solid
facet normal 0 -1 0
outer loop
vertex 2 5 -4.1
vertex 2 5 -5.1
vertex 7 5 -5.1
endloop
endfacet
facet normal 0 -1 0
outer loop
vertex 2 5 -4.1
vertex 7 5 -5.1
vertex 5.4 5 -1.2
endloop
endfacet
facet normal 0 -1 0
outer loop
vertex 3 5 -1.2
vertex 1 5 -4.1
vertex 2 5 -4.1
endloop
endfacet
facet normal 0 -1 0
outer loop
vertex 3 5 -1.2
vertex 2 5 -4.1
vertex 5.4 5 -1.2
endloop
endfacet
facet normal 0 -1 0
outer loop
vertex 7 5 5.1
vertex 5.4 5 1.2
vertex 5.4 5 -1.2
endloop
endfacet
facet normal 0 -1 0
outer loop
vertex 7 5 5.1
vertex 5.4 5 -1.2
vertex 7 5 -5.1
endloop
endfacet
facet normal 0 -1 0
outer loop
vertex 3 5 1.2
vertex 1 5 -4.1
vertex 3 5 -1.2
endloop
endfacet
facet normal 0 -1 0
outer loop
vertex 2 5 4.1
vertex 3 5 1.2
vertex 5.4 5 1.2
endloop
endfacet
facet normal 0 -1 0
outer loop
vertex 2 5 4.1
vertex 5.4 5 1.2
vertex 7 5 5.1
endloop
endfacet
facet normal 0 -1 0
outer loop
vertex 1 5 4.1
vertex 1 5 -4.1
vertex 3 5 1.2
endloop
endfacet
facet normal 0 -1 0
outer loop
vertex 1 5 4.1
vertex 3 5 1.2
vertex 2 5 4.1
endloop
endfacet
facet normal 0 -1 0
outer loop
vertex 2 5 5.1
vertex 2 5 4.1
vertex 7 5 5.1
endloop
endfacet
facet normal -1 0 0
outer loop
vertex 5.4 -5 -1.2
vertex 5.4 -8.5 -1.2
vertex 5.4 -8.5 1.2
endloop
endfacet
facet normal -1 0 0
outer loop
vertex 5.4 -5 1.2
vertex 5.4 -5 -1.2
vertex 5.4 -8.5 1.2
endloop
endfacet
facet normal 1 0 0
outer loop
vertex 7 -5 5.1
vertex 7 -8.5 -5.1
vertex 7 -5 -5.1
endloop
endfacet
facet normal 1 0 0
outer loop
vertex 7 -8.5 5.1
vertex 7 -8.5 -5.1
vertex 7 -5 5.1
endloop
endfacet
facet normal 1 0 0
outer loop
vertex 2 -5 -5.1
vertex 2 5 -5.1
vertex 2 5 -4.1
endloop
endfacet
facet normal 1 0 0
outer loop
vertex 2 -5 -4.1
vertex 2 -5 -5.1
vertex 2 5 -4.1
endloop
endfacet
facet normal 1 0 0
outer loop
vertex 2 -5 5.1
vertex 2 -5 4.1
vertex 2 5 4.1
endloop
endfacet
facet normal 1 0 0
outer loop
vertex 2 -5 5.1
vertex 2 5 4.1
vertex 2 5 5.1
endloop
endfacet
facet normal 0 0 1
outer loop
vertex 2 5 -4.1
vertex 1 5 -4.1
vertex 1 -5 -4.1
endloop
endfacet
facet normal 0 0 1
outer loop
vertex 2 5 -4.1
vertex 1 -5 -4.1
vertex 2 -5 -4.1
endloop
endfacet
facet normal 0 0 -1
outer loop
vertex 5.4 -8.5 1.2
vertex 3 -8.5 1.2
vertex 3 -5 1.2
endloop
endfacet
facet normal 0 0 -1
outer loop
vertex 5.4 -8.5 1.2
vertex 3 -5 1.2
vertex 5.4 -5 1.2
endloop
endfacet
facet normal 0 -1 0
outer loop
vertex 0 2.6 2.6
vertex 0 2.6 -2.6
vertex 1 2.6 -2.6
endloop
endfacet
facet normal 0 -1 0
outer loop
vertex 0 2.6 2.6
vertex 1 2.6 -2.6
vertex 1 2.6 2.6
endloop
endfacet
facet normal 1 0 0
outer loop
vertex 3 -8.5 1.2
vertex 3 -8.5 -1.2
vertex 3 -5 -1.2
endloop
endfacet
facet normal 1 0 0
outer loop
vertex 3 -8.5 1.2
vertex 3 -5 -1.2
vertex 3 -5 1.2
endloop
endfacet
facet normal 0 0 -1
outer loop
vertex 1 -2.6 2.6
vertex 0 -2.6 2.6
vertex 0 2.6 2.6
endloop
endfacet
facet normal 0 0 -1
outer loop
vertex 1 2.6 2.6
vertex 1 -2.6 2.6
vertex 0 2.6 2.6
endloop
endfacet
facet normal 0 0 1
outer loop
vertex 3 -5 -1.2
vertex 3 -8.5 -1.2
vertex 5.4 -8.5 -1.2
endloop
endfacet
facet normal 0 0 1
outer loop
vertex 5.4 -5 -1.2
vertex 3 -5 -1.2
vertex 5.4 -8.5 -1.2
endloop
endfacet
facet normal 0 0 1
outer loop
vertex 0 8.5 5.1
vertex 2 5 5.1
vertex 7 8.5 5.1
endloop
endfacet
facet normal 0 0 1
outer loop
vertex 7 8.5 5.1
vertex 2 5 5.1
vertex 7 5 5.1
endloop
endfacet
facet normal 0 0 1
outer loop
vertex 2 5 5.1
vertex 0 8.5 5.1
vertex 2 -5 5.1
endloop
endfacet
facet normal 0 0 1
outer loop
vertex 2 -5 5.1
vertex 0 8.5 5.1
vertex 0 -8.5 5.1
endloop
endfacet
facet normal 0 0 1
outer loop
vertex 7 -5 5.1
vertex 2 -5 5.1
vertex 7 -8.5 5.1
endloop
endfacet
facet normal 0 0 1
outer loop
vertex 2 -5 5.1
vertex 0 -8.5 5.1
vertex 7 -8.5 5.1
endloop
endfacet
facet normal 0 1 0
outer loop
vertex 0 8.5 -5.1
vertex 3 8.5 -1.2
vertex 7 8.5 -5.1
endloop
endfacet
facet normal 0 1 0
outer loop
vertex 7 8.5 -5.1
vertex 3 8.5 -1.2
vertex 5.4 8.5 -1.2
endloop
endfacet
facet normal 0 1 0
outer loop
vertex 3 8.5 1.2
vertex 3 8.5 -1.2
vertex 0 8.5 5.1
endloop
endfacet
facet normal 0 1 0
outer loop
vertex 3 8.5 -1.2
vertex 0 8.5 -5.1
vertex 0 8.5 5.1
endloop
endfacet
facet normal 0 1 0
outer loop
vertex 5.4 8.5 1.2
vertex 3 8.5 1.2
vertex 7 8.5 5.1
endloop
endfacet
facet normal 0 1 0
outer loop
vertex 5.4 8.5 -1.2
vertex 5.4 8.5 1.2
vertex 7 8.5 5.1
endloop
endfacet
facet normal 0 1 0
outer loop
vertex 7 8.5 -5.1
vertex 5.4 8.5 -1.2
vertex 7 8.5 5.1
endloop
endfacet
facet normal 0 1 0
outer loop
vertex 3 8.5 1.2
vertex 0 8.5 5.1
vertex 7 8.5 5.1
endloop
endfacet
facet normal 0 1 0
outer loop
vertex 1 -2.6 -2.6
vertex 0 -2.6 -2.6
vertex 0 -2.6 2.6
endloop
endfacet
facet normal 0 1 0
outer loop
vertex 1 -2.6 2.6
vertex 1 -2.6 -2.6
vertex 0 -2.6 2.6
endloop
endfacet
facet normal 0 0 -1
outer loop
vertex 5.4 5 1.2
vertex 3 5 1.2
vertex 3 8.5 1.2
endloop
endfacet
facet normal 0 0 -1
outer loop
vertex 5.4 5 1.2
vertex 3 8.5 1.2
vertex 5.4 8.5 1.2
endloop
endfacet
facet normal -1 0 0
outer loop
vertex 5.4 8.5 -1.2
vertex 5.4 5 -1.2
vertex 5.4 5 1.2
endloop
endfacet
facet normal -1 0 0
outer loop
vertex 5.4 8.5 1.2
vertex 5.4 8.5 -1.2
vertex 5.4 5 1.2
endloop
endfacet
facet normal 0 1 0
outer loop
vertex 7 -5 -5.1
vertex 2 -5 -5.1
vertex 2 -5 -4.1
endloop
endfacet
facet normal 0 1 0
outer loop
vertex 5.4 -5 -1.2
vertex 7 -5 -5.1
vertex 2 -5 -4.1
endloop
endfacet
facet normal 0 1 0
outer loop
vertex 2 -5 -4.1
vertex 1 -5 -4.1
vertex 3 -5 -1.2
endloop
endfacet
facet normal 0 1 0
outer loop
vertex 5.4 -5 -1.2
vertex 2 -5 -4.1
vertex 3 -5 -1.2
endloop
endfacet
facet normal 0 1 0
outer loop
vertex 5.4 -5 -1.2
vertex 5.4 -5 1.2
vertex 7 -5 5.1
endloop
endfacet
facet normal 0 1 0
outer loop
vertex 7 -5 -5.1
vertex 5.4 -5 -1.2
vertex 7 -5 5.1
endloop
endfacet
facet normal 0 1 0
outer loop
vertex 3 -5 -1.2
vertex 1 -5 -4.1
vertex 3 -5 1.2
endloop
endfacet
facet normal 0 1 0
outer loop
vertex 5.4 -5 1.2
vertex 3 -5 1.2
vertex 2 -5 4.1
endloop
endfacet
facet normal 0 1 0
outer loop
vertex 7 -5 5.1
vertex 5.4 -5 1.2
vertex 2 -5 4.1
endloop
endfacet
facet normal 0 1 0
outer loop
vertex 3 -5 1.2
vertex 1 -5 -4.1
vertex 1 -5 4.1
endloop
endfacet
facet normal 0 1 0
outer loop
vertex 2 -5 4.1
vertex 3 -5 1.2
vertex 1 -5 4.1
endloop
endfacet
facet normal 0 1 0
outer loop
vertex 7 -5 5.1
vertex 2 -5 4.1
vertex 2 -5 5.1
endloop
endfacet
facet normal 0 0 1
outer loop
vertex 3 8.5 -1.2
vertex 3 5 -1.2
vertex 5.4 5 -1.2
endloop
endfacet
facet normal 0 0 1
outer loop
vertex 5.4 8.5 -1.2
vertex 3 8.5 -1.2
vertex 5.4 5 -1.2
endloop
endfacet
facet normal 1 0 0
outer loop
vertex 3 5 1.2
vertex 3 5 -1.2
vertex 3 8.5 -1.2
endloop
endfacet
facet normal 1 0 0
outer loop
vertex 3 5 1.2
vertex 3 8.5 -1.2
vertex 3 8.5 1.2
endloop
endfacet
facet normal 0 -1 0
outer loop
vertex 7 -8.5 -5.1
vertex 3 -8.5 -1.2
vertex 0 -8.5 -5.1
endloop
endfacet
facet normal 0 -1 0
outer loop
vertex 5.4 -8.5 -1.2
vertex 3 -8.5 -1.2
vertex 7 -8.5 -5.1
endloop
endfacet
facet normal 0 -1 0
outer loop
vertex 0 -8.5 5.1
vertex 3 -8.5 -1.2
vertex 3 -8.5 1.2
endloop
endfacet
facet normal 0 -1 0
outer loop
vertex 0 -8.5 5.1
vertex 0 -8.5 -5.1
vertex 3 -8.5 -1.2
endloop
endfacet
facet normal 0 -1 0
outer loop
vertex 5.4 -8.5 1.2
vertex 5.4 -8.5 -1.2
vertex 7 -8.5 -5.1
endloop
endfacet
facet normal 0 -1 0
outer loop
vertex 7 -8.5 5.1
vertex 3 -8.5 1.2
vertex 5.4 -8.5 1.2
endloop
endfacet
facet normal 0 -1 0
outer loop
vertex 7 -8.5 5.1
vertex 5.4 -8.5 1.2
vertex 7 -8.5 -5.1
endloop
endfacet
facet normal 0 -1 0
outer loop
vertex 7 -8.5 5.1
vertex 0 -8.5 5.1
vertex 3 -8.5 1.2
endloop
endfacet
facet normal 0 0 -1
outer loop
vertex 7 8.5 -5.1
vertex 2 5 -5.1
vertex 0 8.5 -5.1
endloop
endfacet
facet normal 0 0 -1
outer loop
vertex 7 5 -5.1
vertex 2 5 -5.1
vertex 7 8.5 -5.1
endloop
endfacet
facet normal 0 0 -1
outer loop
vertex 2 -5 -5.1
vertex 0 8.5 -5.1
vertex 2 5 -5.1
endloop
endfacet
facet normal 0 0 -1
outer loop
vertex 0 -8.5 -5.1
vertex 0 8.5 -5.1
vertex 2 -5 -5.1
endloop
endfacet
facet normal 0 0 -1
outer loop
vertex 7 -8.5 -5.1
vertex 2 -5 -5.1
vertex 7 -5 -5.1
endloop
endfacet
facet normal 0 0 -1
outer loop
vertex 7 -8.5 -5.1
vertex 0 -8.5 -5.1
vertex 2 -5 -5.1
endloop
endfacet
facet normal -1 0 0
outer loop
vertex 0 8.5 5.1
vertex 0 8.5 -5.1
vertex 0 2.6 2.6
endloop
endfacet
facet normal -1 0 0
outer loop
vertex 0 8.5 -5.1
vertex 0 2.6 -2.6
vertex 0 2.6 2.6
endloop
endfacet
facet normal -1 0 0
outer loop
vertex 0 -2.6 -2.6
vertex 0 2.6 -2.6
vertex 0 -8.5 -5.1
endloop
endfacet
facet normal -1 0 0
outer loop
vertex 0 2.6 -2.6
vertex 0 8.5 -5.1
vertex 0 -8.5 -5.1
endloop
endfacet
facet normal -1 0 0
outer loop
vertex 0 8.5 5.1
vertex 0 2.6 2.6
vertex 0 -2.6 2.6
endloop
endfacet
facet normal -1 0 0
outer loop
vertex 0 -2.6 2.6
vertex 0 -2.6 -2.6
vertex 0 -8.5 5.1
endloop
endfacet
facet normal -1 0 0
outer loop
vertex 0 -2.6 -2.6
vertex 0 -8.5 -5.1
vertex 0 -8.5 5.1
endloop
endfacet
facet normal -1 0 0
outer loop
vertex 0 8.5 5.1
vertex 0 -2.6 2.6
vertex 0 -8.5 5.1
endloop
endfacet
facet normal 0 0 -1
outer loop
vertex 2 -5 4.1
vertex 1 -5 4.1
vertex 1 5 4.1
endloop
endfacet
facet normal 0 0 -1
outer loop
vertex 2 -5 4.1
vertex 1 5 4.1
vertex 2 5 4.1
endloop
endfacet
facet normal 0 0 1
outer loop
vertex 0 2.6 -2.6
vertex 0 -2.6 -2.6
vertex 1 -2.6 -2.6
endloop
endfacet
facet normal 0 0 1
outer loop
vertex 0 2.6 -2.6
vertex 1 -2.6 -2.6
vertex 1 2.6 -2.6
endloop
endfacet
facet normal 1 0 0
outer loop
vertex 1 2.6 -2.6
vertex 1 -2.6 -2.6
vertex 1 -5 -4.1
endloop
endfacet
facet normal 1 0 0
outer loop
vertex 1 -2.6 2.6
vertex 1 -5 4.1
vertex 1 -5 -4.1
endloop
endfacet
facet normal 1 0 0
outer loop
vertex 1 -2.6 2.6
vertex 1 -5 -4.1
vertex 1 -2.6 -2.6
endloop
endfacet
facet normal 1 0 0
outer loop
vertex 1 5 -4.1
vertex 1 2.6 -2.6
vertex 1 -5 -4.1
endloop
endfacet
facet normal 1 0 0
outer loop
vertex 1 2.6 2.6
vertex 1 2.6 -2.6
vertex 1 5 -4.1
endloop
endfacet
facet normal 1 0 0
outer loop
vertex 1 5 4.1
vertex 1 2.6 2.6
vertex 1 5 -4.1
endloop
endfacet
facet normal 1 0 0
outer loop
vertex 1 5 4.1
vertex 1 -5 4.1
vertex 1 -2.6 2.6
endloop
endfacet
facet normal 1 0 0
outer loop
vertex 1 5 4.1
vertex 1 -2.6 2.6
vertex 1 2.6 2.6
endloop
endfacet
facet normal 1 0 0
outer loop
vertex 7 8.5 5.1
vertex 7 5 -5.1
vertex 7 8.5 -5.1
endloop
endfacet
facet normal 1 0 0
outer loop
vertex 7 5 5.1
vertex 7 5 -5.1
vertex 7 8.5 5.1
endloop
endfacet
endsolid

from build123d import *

# Parameters (mm, degrees)
SKETCH049_W      = 1
SKETCH049_H      = 1
EXTRUDE052_DEPTH = 8.5
SKETCH048_W      = 2.4
SKETCH048_H      = 2.4
EXTRUDE051_DEPTH = 8.5
SKETCH046_W      = 5.2
SKETCH046_H      = 5.2
EXTRUDE049_DEPTH = 1
SKETCH047_W      = 10
SKETCH047_H      = 10.2
EXTRUDE050_DEPTH = 8
SKETCH045_W      = 7
SKETCH045_H      = 10.2
EXTRUDE048_DEPTH = 8.5


with BuildPart() as extrude052:
    # Sketch049 → Extrude052 (new body, symmetric)
    with BuildSketch(Plane.XZ):
        with Locations((1.5, -4.6)):
            Rectangle(SKETCH049_W, SKETCH049_H)
        with Locations((1.5, 4.6)):
            Rectangle(SKETCH049_W, SKETCH049_H)
    extrude(amount=EXTRUDE052_DEPTH, both=True)


with BuildPart() as extrude_buco_per_perno_blocco_neopixel:
    # Sketch048 → Extrude051 (new body, symmetric)
    with BuildSketch(Plane.XZ):
        with Locations((4.2, 0)):
            Rectangle(SKETCH048_W, SKETCH048_H)
    extrude(amount=EXTRUDE051_DEPTH, both=True)


with BuildPart() as extrude_scavo_5x5_neopixel:
    # Sketch046 → Extrude049 (new body)
    with BuildSketch(Plane.YZ):
        Rectangle(SKETCH046_W, SKETCH046_H)
    extrude(amount=EXTRUDE049_DEPTH)


with BuildPart() as extrude_scavo_10x10_neopixel_corpo:
    # Sketch047 → Extrude050 (new body)
    with BuildSketch(Plane.YZ):
        Rectangle(SKETCH047_W, SKETCH047_H)
    extrude(amount=EXTRUDE050_DEPTH)


with BuildPart() as extrude_scavo_10x10_neopixel_corpo_1:
    # Extrude050 placement: moved
    add(extrude_scavo_10x10_neopixel_corpo.part.moved(Location((1, 0, 0))))


with BuildPart() as fusion_neopixel:
    # Sketch045 → Extrude048 (new body, symmetric)
    with BuildSketch(Plane.XZ):
        with Locations((3.5, 0)):
            Rectangle(SKETCH045_W, SKETCH045_H)
    extrude(amount=EXTRUDE048_DEPTH, both=True)

    # Cut030: cut Extrude scavo 10x10 neopixel corpo
    add(extrude_scavo_10x10_neopixel_corpo_1.part, mode=Mode.SUBTRACT)

    # Cut031: cut Extrude scavo 5x5 neopixel
    add(extrude_scavo_5x5_neopixel.part, mode=Mode.SUBTRACT)

    # Cut032: cut Extrude buco per perno blocco neopixel
    add(extrude_buco_per_perno_blocco_neopixel.part, mode=Mode.SUBTRACT)

    # Fusion001: union Extrude052
    add(extrude052.part)


solid = fusion_neopixel.part
